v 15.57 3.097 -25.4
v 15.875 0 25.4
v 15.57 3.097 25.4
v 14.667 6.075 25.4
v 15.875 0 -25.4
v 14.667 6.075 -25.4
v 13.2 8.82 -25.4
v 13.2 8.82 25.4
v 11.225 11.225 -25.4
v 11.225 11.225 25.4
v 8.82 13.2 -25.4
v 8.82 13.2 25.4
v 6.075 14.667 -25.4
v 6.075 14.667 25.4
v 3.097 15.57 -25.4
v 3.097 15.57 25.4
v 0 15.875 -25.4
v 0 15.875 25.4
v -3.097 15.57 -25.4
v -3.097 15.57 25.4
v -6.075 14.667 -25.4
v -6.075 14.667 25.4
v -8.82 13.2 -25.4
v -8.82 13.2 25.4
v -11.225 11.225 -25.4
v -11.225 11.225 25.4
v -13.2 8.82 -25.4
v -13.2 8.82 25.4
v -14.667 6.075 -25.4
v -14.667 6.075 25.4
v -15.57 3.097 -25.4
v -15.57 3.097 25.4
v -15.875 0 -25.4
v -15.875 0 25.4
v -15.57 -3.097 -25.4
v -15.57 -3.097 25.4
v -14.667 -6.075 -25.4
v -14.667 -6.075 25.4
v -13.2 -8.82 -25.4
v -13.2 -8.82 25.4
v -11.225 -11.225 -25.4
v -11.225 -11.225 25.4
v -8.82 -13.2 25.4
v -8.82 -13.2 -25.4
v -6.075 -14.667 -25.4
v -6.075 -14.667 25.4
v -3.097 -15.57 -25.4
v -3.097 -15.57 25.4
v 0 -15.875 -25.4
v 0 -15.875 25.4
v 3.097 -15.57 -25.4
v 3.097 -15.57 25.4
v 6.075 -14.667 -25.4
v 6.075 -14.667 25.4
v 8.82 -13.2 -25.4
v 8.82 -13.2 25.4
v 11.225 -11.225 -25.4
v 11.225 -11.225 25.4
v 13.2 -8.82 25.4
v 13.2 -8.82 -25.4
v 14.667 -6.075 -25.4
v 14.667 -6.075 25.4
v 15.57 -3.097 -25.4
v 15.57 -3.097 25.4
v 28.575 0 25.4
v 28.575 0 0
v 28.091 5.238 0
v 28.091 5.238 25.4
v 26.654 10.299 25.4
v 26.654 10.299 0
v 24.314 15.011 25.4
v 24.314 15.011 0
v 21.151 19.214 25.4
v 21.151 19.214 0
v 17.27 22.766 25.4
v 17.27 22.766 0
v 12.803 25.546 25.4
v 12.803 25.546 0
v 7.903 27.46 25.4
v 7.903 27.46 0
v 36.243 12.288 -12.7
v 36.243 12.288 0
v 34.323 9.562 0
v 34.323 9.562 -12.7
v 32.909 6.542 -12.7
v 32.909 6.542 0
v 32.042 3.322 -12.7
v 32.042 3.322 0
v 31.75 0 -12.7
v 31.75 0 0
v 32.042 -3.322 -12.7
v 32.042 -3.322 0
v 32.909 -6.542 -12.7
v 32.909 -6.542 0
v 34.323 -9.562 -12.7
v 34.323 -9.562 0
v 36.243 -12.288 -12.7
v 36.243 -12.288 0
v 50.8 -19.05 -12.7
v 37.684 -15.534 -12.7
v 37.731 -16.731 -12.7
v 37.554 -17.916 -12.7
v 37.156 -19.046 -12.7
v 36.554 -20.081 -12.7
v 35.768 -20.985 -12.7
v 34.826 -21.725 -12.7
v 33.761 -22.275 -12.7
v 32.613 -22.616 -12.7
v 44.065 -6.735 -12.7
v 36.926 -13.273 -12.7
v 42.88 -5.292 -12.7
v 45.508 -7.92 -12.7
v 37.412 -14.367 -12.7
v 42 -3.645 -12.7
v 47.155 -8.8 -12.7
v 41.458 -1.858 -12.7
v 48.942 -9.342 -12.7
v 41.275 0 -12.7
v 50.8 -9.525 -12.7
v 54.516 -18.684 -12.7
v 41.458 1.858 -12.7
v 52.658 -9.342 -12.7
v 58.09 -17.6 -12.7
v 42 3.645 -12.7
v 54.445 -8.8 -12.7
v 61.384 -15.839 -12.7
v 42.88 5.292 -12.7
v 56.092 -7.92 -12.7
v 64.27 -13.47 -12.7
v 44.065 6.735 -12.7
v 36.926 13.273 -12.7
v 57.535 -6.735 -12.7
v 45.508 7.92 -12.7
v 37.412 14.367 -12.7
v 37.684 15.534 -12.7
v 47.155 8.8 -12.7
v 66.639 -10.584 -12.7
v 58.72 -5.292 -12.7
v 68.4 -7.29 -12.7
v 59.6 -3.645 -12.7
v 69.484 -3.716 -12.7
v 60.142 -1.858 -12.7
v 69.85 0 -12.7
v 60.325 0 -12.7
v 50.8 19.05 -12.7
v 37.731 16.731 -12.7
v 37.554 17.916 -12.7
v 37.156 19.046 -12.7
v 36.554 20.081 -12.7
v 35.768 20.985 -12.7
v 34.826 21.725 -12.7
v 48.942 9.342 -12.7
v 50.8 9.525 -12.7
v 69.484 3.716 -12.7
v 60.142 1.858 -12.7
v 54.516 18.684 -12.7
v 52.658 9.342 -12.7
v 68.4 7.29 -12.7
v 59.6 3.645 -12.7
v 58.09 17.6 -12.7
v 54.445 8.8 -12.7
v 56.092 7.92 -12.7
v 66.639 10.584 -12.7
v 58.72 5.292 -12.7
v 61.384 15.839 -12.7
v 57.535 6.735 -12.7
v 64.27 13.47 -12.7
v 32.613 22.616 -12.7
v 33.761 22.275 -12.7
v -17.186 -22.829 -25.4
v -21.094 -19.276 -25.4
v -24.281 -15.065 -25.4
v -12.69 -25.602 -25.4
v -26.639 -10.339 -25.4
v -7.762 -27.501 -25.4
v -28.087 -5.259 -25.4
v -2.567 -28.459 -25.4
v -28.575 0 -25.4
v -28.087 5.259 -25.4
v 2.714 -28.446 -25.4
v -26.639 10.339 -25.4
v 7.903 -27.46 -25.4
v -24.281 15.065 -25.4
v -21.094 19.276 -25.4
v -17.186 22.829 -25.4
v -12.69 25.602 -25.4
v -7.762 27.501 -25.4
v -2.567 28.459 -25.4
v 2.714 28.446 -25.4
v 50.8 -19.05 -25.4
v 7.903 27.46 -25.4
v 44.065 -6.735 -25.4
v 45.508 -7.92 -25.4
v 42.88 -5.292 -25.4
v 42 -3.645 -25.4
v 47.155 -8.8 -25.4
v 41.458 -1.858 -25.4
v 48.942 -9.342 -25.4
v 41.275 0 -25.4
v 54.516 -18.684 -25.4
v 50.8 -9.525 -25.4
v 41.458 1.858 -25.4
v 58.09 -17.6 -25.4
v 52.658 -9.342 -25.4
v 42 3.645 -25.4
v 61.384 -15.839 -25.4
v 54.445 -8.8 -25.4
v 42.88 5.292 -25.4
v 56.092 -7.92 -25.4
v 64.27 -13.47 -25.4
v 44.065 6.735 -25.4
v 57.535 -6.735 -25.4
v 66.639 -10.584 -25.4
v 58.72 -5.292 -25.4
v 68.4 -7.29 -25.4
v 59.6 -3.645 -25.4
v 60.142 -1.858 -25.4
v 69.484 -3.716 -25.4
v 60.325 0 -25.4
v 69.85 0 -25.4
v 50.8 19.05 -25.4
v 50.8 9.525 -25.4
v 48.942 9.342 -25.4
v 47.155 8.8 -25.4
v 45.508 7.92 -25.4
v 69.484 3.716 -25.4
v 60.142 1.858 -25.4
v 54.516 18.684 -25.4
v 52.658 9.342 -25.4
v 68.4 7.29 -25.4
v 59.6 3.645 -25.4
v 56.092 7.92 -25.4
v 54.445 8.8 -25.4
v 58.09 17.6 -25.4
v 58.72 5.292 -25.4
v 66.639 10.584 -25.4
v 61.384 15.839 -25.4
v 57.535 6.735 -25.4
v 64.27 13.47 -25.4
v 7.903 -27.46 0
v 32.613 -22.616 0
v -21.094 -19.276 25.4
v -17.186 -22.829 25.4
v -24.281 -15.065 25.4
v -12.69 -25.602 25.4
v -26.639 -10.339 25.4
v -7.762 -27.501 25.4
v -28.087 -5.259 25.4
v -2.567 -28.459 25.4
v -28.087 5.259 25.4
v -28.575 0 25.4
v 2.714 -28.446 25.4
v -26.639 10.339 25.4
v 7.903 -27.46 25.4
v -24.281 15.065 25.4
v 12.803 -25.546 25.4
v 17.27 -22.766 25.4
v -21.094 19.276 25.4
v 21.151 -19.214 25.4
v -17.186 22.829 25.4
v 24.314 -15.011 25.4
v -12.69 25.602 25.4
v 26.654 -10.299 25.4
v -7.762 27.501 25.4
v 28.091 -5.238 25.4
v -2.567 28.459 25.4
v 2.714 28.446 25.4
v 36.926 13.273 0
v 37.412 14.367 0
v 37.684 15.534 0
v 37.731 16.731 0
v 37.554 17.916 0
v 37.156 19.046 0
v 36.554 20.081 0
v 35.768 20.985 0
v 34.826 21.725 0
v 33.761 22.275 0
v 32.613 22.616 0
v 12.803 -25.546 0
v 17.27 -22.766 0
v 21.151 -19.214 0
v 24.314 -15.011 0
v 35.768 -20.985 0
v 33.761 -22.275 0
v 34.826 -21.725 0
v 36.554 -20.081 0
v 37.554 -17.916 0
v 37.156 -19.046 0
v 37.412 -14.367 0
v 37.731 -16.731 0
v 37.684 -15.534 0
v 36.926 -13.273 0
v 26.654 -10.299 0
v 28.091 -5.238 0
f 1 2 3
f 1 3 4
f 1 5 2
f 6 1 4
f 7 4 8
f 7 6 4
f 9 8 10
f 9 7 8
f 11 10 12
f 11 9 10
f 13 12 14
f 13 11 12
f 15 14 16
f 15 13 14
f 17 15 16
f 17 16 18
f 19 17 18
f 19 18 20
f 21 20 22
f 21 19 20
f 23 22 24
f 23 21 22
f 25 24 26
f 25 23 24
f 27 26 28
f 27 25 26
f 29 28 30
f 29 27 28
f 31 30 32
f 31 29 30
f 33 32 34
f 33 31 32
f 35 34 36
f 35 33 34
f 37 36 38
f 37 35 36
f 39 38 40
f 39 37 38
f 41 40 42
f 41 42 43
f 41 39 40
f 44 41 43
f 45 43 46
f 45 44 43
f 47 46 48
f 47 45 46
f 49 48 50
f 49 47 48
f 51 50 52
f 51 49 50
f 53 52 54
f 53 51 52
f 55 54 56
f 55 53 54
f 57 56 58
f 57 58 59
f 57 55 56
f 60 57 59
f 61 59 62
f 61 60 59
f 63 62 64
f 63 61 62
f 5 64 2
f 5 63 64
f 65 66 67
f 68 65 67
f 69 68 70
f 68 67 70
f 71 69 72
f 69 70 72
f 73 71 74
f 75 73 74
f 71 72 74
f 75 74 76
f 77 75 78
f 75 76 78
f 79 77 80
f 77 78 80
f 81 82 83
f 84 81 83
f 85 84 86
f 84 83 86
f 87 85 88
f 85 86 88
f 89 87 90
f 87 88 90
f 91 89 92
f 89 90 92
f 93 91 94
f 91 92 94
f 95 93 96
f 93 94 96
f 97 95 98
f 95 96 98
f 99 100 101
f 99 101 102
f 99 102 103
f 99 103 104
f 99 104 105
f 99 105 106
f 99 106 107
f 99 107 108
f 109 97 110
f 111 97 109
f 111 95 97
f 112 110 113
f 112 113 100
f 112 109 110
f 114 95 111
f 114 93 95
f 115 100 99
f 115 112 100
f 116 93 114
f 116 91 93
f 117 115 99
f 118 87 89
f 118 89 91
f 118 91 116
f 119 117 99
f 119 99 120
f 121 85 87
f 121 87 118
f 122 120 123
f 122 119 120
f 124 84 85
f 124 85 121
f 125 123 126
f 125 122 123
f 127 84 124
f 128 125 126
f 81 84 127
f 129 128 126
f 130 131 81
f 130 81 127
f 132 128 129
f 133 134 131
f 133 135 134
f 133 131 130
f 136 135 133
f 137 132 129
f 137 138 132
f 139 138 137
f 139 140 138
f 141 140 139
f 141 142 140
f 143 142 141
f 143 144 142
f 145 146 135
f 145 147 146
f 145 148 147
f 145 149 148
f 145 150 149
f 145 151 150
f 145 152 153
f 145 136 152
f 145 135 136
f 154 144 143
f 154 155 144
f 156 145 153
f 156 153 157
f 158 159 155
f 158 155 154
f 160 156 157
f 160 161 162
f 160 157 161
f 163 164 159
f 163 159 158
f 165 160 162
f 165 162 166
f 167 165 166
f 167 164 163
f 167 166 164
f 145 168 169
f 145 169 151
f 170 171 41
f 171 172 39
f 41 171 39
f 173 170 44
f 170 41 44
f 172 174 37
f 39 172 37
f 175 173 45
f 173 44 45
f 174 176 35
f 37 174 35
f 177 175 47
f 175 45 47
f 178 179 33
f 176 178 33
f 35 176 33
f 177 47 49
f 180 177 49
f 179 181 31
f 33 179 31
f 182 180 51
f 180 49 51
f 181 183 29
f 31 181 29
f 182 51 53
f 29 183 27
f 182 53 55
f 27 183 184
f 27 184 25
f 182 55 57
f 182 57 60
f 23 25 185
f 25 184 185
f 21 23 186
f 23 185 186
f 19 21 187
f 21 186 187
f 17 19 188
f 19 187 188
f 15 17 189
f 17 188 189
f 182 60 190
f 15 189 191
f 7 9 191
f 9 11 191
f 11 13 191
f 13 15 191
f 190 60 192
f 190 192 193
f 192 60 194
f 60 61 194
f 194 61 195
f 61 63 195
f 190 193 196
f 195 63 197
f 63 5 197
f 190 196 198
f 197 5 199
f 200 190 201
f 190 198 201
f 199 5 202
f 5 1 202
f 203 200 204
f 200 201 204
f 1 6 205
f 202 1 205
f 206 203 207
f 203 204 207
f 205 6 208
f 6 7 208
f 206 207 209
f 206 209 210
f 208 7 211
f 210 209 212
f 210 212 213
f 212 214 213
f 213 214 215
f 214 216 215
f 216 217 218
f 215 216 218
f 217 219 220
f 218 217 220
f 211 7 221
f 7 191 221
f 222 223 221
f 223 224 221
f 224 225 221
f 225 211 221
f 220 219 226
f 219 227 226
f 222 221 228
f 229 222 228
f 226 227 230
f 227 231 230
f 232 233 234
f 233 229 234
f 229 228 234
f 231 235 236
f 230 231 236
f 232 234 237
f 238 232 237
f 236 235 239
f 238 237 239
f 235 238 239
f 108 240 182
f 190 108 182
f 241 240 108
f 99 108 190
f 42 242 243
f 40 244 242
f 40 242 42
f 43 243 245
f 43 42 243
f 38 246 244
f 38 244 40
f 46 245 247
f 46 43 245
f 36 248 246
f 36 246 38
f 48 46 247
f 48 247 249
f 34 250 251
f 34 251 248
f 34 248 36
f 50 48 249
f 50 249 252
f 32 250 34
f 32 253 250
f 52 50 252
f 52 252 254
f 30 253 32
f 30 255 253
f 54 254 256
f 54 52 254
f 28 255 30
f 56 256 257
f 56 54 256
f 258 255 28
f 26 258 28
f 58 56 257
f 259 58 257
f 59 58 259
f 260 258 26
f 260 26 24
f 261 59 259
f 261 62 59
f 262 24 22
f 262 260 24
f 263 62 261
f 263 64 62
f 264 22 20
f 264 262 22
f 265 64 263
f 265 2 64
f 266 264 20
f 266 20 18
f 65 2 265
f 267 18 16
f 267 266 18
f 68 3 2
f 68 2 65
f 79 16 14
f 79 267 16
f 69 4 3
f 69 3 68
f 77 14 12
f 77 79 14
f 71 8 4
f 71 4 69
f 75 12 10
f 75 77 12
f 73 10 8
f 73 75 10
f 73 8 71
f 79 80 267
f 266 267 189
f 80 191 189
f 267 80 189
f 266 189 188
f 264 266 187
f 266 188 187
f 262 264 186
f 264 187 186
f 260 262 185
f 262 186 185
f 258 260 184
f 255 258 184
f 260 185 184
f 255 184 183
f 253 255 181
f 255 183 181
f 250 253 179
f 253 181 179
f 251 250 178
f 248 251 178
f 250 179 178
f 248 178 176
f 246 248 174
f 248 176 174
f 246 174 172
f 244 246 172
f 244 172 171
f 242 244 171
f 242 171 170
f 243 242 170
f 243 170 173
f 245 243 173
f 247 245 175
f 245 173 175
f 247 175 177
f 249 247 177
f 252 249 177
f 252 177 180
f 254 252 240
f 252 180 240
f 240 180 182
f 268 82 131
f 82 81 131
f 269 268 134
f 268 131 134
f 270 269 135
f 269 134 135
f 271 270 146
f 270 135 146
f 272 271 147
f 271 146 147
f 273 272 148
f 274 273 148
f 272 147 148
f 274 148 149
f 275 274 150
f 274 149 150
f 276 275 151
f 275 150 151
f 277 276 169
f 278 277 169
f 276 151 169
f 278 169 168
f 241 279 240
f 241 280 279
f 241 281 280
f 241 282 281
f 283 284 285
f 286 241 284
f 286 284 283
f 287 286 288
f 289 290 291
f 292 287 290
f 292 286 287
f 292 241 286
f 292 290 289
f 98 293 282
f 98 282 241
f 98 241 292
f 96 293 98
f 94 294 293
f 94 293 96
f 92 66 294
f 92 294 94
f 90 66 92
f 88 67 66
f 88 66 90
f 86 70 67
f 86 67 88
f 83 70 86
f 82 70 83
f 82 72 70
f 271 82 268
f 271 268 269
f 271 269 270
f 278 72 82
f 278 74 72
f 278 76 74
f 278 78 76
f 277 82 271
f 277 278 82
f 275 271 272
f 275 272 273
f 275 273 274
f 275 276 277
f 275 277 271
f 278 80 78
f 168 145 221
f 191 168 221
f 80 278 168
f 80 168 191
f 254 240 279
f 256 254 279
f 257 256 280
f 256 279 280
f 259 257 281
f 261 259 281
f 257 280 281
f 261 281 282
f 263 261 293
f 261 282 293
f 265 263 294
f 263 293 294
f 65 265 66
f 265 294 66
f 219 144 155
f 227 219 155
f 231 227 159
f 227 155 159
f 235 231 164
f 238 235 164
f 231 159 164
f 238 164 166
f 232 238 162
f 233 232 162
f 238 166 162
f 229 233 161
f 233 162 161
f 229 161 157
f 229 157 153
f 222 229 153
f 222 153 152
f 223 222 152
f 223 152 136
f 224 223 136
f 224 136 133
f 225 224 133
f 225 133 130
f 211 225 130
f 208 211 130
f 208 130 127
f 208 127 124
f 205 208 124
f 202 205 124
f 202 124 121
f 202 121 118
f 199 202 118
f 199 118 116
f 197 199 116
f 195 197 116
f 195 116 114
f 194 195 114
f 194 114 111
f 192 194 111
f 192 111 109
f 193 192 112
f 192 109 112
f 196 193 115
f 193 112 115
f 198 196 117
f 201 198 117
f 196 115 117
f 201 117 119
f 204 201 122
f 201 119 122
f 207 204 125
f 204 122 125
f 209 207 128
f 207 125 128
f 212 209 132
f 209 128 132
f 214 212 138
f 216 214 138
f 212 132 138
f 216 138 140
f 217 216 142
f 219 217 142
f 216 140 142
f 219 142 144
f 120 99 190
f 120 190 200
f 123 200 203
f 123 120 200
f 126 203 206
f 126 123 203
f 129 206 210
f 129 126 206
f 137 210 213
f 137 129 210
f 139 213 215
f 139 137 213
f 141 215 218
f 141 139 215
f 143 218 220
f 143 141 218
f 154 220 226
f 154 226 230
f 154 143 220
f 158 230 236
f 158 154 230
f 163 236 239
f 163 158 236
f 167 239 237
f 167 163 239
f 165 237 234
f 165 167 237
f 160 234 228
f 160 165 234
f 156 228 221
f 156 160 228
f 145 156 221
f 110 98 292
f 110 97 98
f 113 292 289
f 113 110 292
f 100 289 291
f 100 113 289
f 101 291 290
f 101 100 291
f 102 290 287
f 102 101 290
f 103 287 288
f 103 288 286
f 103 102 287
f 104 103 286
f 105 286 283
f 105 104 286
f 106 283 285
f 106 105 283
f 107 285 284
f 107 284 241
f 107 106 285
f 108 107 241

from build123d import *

# Parameters (mm, degrees)
F0_R     = 15.875
F0_R_2   = 9.525
F1_DEPTH = 25.4
F2_DEPTH = 25.4
F3_DEPTH = 12.7
F4_R     = 6.35


with BuildPart() as f1:
    # F0 (on Top) → F1 (new body)
    with BuildSketch(Plane.XY):
        with BuildLine():
            ThreePointArc((7.9032867525, -27.4603110599), (22.829444189, -17.1856656264), (28.575, 0))
            ThreePointArc((28.575, 0), (22.829444189, 17.1856656264), (7.9032867525, 27.4603110599))
            ThreePointArc((7.9032867525, 27.4603110599), (-28.575, 0), (7.9032867525, -27.4603110599))
        make_face()
        Circle(F0_R, mode=Mode.SUBTRACT)
        with BuildLine():
            ThreePointArc((7.9032867525, 27.4603110599), (22.829444189, 17.1856656264), (28.575, 0))
            ThreePointArc((28.575, 0), (22.829444189, -17.1856656264), (7.9032867525, -27.4603110599))
            Line((7.9032867525, -27.4603110599), (50.8, -19.05))
            ThreePointArc((50.8, -19.05), (31.75, 0), (50.8, 19.05))
            Line((50.8, 19.05), (7.9032867525, 27.4603110599))
        make_face()
        with BuildLine():
            ThreePointArc((69.85, 0), (64.2703841816, 13.4703841816), (50.8, 19.05))
            ThreePointArc((50.8, 19.05), (31.75, 0), (50.8, -19.05))
            ThreePointArc((50.8, -19.05), (64.2703841816, -13.4703841816), (69.85, 0))
        make_face()
        with Locations((50.8, 0)):
            Circle(F0_R_2, mode=Mode.SUBTRACT)
    extrude(amount=-F1_DEPTH)

    # F0 (on Top) → F2 (join)
    with BuildSketch(Plane.XY):
        with BuildLine():
            ThreePointArc((7.9032867525, -27.4603110599), (22.829444189, -17.1856656264), (28.575, 0))
            ThreePointArc((28.575, 0), (22.829444189, 17.1856656264), (7.9032867525, 27.4603110599))
            ThreePointArc((7.9032867525, 27.4603110599), (-28.575, 0), (7.9032867525, -27.4603110599))
        make_face()
        Circle(F0_R, mode=Mode.SUBTRACT)
    extrude(amount=F2_DEPTH)

    # F0 (on Top) → F3 (cut)
    with BuildSketch(Plane.XY):
        with BuildLine():
            ThreePointArc((69.85, 0), (64.2703841816, 13.4703841816), (50.8, 19.05))
            ThreePointArc((50.8, 19.05), (31.75, 0), (50.8, -19.05))
            ThreePointArc((50.8, -19.05), (64.2703841816, -13.4703841816), (69.85, 0))
        make_face()
        with Locations((50.8, 0)):
            Circle(F0_R_2, mode=Mode.SUBTRACT)
    extrude(amount=-F3_DEPTH, mode=Mode.SUBTRACT)

    # F4
    f4_edges = [f1.edges().sort_by_distance(p)[0] for p in [
        (50.8, 19.05, -6.35),
        (50.8, -19.05, -6.35),
    ]]
    fillet(f4_edges, radius=F4_R)


solid = f1.part
